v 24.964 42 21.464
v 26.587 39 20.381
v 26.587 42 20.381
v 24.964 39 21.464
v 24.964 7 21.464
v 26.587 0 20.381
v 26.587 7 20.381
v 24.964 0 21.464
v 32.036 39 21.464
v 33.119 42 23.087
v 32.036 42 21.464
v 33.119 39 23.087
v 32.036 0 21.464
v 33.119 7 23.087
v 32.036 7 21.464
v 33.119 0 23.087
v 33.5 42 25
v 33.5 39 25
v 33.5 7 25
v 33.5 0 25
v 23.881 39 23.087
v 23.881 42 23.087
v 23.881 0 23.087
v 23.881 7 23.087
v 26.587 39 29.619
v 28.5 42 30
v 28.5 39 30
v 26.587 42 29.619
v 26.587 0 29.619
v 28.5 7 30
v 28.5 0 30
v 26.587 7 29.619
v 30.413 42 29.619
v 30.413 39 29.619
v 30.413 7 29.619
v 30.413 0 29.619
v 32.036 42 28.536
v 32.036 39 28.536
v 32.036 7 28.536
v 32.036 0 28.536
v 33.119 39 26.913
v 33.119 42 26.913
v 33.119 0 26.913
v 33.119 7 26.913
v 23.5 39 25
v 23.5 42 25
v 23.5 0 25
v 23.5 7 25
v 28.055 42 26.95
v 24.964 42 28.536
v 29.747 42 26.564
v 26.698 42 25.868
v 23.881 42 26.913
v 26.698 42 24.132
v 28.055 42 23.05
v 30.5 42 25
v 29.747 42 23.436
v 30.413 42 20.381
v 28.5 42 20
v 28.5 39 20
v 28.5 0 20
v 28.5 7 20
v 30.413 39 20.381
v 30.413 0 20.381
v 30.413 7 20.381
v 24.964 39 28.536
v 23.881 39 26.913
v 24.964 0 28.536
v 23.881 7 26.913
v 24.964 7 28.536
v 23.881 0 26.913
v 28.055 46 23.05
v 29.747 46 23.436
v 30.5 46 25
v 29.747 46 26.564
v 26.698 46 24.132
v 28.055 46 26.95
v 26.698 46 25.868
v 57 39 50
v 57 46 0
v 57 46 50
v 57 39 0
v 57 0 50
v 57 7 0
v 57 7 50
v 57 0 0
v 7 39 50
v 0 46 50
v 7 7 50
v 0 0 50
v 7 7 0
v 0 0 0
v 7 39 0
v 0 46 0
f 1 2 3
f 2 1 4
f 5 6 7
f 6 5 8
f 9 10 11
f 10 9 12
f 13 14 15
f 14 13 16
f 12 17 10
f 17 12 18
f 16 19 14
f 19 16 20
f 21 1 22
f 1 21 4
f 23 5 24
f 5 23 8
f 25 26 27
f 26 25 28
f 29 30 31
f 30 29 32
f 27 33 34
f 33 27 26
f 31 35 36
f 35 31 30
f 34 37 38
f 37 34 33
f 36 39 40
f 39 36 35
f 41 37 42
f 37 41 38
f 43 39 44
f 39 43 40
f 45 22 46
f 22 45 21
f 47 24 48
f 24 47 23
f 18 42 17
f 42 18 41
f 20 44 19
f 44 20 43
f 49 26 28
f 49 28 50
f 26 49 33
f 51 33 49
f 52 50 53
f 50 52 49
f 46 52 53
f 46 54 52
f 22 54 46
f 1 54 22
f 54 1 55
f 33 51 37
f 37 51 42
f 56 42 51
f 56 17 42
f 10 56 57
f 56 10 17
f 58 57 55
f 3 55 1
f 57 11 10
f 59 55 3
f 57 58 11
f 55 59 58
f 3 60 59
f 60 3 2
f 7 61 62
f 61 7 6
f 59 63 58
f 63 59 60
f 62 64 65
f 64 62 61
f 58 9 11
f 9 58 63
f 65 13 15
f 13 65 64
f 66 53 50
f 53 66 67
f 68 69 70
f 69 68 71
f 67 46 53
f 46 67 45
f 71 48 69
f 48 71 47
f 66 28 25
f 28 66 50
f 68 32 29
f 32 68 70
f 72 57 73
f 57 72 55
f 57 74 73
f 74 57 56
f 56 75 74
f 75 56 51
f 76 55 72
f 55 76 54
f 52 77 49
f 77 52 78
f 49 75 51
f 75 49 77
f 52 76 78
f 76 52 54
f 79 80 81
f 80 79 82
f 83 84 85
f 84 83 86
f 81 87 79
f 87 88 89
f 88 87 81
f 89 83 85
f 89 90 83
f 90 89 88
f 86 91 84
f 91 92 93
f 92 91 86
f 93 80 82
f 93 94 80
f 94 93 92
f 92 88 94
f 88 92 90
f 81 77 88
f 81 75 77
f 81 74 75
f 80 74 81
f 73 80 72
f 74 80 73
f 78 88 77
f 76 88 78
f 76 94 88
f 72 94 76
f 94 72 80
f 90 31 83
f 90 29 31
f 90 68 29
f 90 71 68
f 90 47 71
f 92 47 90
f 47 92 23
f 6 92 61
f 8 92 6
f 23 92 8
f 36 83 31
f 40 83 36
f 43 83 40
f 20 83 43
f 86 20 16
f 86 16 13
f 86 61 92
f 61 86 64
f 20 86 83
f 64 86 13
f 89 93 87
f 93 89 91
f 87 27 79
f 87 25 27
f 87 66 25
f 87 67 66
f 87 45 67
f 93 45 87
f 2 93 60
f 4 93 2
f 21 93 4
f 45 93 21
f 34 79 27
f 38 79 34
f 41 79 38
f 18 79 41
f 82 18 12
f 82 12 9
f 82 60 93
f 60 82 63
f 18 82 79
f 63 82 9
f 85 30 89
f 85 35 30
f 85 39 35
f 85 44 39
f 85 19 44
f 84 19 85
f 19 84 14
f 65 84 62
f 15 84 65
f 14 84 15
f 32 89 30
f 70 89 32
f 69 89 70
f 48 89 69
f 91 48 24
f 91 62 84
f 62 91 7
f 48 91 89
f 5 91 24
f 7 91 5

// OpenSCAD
laptopThickness = 32;
powerSocketDiameter = 12;
powerSocketDepth = 1;
laptopHeight = 1;
segmentHeight = 50;
segmentWidth = 50;
wallThickness = 7;
bottom = 0;
flip=1;

screwDiameter = 4;
screwHeadDiameter = 10;
screwWall = 5;


difference(){
    cube([segmentWidth+wallThickness,wallThickness*2+laptopThickness,segmentHeight+(wallThickness*bottom)]);
    translate([wallThickness,wallThickness,(wallThickness*bottom)-1])cube([segmentWidth+1,laptopThickness,segmentHeight+2]);
    translate([0,(flip*(wallThickness*2+laptopThickness+2)),0]) translate([(segmentWidth+wallThickness)/2,-1,(segmentHeight/2)+(wallThickness*bottom)]) rotate([-90,0,0]) mirror([0,0,flip]) screw();
}


module screw(){
    translate([0,0,screwWall]) cylinder(h=(wallThickness*2+laptopThickness),d=screwHeadDiameter);
    cylinder(h=(screwWall+2),d=screwDiameter);
} 
